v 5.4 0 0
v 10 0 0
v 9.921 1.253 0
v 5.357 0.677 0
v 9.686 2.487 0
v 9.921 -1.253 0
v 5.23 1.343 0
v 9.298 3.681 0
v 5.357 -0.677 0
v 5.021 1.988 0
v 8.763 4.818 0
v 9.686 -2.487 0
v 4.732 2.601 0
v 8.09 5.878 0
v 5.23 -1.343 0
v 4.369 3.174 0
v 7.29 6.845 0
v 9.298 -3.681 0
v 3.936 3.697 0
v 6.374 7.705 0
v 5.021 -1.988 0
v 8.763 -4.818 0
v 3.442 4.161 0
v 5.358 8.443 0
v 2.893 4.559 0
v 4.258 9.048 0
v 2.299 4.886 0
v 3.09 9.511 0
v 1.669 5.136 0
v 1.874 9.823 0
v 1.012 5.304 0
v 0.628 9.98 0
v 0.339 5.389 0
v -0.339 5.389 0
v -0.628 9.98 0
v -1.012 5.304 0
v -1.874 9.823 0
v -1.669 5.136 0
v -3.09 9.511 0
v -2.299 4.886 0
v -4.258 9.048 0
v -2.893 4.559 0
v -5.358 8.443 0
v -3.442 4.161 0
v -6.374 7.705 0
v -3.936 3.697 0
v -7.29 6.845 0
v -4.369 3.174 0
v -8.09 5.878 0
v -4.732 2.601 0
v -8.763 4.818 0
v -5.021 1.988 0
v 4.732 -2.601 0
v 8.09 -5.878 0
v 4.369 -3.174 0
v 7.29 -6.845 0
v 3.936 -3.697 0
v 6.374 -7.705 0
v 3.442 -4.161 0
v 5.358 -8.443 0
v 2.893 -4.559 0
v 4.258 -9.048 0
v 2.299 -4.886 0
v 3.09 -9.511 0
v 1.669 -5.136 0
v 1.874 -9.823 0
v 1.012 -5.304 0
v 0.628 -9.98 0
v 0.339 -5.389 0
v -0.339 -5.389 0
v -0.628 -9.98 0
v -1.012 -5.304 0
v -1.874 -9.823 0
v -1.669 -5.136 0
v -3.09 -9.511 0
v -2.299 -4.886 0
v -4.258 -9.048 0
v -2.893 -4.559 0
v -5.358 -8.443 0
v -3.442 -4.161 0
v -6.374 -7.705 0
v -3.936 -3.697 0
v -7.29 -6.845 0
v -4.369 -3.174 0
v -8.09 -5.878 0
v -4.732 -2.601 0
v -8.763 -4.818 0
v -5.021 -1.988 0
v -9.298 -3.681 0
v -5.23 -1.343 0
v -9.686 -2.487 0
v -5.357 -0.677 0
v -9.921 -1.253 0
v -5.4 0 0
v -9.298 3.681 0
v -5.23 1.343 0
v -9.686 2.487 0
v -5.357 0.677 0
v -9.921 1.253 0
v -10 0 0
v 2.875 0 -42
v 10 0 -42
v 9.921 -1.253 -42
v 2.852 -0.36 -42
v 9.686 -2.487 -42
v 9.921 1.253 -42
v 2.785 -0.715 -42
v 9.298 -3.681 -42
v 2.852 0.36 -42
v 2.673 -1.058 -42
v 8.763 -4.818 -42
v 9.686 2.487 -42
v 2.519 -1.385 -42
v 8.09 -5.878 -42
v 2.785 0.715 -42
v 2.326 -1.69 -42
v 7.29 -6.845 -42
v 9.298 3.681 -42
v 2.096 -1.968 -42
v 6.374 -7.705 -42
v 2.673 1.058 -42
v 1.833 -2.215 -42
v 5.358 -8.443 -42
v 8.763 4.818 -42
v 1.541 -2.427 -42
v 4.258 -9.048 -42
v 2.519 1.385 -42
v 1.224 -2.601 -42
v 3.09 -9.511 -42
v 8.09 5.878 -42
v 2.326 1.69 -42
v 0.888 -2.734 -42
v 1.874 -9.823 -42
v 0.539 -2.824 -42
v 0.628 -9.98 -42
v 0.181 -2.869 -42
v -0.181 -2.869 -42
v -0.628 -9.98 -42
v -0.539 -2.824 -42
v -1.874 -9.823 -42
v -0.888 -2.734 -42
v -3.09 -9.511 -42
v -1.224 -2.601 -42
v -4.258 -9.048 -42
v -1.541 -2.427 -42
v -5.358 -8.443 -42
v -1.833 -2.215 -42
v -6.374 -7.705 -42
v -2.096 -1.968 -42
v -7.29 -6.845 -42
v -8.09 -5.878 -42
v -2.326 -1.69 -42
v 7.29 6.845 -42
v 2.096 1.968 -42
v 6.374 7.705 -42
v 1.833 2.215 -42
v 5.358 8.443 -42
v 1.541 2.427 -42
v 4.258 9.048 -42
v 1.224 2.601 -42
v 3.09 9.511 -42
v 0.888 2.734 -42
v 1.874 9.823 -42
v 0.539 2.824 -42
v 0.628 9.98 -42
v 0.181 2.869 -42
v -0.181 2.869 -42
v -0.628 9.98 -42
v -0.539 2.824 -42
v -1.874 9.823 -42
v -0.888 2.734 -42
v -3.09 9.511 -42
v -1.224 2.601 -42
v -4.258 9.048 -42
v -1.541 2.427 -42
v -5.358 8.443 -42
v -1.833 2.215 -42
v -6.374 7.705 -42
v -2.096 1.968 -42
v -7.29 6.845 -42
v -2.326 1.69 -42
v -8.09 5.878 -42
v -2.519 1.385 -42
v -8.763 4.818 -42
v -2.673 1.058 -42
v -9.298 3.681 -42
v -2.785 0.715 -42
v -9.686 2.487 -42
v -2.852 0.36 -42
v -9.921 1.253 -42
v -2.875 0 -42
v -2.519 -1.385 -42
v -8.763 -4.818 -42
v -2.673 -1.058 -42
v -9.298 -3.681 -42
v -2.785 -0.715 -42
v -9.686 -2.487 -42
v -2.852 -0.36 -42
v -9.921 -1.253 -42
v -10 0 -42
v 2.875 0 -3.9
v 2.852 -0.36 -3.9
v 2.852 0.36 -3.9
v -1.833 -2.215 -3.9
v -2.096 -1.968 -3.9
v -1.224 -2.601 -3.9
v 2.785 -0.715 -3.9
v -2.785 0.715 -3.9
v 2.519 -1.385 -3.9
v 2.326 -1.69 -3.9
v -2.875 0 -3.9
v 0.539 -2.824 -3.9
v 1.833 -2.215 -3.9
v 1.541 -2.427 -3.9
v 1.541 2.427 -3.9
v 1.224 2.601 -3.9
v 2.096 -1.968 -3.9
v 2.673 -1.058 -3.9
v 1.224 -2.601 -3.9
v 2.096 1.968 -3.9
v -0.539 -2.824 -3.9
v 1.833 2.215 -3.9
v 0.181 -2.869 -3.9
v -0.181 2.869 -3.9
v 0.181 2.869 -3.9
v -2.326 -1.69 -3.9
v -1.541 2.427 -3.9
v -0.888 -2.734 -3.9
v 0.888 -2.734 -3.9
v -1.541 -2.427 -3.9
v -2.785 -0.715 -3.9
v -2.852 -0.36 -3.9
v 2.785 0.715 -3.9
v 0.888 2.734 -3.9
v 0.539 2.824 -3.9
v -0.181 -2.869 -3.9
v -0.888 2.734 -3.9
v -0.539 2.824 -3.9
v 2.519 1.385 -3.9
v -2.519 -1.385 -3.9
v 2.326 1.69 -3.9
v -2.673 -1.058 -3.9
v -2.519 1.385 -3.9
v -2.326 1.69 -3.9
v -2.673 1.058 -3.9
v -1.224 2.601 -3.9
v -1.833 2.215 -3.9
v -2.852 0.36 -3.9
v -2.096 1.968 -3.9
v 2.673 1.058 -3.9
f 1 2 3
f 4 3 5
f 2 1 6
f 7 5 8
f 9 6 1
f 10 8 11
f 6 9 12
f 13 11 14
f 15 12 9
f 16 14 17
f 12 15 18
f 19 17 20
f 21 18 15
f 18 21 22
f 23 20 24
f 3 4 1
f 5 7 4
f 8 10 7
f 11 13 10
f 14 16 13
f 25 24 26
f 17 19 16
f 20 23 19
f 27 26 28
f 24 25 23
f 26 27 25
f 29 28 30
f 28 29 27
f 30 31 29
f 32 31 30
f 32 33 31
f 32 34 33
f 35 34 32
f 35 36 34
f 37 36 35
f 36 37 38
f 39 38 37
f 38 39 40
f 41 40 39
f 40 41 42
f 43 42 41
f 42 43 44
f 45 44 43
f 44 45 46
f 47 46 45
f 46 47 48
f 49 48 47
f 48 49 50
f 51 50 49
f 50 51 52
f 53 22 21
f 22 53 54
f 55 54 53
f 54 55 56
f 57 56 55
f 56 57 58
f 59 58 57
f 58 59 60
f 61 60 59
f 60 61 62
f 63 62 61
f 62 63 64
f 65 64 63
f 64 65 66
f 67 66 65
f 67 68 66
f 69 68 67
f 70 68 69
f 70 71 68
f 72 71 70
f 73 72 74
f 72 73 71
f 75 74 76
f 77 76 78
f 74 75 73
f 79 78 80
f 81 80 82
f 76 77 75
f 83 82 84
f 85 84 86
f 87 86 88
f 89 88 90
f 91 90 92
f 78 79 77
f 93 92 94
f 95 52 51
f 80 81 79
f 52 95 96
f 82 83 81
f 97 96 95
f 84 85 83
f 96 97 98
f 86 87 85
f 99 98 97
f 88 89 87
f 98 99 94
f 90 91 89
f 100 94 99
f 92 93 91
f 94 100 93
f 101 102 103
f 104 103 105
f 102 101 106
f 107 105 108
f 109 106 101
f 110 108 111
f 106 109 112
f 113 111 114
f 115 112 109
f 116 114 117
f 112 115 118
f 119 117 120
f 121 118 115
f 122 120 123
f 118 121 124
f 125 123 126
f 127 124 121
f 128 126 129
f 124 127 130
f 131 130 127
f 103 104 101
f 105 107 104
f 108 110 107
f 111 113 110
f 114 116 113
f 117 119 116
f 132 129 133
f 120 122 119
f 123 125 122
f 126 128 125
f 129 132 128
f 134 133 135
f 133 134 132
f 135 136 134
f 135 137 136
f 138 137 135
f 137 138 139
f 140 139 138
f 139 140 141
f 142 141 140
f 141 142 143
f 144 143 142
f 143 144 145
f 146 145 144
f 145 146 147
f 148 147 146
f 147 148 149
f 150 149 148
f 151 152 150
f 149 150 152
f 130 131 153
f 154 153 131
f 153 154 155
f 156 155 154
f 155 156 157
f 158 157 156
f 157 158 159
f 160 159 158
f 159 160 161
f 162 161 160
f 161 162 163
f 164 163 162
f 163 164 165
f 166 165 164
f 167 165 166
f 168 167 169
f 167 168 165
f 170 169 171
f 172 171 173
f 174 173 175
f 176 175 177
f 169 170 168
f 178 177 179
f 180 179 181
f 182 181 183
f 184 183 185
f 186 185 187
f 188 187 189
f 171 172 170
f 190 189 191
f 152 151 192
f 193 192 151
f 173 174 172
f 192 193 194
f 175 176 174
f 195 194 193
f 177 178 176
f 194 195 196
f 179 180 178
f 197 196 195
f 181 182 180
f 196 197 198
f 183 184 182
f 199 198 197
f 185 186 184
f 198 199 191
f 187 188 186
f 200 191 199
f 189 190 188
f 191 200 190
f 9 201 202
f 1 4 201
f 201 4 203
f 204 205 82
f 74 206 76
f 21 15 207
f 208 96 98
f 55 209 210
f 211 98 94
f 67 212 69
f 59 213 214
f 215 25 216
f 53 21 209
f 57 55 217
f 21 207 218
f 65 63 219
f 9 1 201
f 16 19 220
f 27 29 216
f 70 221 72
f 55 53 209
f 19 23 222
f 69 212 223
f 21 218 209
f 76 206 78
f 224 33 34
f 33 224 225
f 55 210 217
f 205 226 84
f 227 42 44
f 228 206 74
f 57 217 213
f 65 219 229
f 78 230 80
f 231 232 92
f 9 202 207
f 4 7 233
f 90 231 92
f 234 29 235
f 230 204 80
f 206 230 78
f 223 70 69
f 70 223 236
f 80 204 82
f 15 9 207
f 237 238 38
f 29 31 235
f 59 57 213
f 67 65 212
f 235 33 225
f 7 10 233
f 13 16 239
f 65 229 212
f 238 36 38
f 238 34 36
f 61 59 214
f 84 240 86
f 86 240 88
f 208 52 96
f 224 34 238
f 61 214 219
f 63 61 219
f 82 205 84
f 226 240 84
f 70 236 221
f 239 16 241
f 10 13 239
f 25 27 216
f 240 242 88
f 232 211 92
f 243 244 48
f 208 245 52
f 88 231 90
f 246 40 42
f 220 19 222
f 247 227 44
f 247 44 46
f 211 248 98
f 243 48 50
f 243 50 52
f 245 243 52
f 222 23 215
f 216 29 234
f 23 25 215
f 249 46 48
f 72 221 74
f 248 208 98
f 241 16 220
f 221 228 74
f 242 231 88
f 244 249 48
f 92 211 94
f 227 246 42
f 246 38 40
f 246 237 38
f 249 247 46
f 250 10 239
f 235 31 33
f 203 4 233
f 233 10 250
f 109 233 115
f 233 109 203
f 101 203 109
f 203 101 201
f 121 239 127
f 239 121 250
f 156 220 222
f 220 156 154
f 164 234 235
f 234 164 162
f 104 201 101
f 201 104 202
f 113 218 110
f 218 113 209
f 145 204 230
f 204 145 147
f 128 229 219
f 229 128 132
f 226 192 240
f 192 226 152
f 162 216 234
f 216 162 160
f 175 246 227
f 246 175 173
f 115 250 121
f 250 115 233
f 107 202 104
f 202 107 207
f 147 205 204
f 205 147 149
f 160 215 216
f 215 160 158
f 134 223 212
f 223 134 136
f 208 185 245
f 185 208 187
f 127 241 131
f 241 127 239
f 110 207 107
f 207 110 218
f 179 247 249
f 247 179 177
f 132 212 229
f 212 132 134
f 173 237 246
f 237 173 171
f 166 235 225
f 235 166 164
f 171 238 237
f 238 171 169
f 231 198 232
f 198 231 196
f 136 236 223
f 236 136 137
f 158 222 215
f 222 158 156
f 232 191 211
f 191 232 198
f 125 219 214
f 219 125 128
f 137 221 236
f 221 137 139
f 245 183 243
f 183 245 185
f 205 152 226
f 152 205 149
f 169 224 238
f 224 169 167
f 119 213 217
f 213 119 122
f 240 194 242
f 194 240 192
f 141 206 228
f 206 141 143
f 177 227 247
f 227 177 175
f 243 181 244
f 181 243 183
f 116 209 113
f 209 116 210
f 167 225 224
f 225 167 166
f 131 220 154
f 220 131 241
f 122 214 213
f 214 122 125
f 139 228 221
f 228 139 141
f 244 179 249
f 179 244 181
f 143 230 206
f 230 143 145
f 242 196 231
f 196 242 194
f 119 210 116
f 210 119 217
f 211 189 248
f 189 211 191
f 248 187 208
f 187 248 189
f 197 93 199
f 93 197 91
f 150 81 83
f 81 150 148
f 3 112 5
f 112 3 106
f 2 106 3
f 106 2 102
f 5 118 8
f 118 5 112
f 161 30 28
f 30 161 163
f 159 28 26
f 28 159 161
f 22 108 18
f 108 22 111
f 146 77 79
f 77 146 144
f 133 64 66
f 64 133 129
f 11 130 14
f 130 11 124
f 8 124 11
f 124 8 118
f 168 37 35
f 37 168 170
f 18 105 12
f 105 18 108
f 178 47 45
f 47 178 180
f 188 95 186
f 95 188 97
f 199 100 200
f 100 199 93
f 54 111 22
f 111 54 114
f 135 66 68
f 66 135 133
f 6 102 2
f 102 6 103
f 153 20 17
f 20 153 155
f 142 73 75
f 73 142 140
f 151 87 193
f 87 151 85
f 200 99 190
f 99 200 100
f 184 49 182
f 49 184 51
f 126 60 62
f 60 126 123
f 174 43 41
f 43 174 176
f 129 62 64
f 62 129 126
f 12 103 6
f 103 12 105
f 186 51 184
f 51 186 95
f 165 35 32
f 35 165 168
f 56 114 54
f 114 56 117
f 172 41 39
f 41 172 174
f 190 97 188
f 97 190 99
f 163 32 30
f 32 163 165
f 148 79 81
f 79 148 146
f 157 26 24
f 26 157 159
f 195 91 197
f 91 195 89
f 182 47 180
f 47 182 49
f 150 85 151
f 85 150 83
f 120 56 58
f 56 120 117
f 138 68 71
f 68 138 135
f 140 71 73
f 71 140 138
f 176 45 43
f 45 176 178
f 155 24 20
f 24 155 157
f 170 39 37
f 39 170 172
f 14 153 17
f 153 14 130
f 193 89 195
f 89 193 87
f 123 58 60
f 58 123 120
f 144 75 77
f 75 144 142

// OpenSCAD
$fn = 50;


difference() {
	union() {
		translate(v = [0, 0, -42.0000000000]) {
			cylinder(h = 42, r = 10.0000000000);
		}
		cylinder(h = 0, r = 20.0000000000);
	}
	union() {
		translate(v = [0, 0, 0]) {
			rotate(a = [0, 0, 0]) {
				difference() {
					union() {
						#translate(v = [0, 0, -42.0000000000]) {
							cylinder(h = 42, r = 2.6000000000);
						}
						#translate(v = [0, 0, -3.9000000000]) {
							cylinder(h = 3.9000000000, r1 = 2.8750000000, r2 = 5.4000000000);
						}
						#translate(v = [0, 0, -42.0000000000]) {
							cylinder(h = 42, r = 2.8750000000);
						}
						#translate(v = [0, 0, -42.0000000000]) {
							cylinder(h = 42, r = 2.6000000000);
						}
					}
					union();
				}
			}
		}
	}
}
